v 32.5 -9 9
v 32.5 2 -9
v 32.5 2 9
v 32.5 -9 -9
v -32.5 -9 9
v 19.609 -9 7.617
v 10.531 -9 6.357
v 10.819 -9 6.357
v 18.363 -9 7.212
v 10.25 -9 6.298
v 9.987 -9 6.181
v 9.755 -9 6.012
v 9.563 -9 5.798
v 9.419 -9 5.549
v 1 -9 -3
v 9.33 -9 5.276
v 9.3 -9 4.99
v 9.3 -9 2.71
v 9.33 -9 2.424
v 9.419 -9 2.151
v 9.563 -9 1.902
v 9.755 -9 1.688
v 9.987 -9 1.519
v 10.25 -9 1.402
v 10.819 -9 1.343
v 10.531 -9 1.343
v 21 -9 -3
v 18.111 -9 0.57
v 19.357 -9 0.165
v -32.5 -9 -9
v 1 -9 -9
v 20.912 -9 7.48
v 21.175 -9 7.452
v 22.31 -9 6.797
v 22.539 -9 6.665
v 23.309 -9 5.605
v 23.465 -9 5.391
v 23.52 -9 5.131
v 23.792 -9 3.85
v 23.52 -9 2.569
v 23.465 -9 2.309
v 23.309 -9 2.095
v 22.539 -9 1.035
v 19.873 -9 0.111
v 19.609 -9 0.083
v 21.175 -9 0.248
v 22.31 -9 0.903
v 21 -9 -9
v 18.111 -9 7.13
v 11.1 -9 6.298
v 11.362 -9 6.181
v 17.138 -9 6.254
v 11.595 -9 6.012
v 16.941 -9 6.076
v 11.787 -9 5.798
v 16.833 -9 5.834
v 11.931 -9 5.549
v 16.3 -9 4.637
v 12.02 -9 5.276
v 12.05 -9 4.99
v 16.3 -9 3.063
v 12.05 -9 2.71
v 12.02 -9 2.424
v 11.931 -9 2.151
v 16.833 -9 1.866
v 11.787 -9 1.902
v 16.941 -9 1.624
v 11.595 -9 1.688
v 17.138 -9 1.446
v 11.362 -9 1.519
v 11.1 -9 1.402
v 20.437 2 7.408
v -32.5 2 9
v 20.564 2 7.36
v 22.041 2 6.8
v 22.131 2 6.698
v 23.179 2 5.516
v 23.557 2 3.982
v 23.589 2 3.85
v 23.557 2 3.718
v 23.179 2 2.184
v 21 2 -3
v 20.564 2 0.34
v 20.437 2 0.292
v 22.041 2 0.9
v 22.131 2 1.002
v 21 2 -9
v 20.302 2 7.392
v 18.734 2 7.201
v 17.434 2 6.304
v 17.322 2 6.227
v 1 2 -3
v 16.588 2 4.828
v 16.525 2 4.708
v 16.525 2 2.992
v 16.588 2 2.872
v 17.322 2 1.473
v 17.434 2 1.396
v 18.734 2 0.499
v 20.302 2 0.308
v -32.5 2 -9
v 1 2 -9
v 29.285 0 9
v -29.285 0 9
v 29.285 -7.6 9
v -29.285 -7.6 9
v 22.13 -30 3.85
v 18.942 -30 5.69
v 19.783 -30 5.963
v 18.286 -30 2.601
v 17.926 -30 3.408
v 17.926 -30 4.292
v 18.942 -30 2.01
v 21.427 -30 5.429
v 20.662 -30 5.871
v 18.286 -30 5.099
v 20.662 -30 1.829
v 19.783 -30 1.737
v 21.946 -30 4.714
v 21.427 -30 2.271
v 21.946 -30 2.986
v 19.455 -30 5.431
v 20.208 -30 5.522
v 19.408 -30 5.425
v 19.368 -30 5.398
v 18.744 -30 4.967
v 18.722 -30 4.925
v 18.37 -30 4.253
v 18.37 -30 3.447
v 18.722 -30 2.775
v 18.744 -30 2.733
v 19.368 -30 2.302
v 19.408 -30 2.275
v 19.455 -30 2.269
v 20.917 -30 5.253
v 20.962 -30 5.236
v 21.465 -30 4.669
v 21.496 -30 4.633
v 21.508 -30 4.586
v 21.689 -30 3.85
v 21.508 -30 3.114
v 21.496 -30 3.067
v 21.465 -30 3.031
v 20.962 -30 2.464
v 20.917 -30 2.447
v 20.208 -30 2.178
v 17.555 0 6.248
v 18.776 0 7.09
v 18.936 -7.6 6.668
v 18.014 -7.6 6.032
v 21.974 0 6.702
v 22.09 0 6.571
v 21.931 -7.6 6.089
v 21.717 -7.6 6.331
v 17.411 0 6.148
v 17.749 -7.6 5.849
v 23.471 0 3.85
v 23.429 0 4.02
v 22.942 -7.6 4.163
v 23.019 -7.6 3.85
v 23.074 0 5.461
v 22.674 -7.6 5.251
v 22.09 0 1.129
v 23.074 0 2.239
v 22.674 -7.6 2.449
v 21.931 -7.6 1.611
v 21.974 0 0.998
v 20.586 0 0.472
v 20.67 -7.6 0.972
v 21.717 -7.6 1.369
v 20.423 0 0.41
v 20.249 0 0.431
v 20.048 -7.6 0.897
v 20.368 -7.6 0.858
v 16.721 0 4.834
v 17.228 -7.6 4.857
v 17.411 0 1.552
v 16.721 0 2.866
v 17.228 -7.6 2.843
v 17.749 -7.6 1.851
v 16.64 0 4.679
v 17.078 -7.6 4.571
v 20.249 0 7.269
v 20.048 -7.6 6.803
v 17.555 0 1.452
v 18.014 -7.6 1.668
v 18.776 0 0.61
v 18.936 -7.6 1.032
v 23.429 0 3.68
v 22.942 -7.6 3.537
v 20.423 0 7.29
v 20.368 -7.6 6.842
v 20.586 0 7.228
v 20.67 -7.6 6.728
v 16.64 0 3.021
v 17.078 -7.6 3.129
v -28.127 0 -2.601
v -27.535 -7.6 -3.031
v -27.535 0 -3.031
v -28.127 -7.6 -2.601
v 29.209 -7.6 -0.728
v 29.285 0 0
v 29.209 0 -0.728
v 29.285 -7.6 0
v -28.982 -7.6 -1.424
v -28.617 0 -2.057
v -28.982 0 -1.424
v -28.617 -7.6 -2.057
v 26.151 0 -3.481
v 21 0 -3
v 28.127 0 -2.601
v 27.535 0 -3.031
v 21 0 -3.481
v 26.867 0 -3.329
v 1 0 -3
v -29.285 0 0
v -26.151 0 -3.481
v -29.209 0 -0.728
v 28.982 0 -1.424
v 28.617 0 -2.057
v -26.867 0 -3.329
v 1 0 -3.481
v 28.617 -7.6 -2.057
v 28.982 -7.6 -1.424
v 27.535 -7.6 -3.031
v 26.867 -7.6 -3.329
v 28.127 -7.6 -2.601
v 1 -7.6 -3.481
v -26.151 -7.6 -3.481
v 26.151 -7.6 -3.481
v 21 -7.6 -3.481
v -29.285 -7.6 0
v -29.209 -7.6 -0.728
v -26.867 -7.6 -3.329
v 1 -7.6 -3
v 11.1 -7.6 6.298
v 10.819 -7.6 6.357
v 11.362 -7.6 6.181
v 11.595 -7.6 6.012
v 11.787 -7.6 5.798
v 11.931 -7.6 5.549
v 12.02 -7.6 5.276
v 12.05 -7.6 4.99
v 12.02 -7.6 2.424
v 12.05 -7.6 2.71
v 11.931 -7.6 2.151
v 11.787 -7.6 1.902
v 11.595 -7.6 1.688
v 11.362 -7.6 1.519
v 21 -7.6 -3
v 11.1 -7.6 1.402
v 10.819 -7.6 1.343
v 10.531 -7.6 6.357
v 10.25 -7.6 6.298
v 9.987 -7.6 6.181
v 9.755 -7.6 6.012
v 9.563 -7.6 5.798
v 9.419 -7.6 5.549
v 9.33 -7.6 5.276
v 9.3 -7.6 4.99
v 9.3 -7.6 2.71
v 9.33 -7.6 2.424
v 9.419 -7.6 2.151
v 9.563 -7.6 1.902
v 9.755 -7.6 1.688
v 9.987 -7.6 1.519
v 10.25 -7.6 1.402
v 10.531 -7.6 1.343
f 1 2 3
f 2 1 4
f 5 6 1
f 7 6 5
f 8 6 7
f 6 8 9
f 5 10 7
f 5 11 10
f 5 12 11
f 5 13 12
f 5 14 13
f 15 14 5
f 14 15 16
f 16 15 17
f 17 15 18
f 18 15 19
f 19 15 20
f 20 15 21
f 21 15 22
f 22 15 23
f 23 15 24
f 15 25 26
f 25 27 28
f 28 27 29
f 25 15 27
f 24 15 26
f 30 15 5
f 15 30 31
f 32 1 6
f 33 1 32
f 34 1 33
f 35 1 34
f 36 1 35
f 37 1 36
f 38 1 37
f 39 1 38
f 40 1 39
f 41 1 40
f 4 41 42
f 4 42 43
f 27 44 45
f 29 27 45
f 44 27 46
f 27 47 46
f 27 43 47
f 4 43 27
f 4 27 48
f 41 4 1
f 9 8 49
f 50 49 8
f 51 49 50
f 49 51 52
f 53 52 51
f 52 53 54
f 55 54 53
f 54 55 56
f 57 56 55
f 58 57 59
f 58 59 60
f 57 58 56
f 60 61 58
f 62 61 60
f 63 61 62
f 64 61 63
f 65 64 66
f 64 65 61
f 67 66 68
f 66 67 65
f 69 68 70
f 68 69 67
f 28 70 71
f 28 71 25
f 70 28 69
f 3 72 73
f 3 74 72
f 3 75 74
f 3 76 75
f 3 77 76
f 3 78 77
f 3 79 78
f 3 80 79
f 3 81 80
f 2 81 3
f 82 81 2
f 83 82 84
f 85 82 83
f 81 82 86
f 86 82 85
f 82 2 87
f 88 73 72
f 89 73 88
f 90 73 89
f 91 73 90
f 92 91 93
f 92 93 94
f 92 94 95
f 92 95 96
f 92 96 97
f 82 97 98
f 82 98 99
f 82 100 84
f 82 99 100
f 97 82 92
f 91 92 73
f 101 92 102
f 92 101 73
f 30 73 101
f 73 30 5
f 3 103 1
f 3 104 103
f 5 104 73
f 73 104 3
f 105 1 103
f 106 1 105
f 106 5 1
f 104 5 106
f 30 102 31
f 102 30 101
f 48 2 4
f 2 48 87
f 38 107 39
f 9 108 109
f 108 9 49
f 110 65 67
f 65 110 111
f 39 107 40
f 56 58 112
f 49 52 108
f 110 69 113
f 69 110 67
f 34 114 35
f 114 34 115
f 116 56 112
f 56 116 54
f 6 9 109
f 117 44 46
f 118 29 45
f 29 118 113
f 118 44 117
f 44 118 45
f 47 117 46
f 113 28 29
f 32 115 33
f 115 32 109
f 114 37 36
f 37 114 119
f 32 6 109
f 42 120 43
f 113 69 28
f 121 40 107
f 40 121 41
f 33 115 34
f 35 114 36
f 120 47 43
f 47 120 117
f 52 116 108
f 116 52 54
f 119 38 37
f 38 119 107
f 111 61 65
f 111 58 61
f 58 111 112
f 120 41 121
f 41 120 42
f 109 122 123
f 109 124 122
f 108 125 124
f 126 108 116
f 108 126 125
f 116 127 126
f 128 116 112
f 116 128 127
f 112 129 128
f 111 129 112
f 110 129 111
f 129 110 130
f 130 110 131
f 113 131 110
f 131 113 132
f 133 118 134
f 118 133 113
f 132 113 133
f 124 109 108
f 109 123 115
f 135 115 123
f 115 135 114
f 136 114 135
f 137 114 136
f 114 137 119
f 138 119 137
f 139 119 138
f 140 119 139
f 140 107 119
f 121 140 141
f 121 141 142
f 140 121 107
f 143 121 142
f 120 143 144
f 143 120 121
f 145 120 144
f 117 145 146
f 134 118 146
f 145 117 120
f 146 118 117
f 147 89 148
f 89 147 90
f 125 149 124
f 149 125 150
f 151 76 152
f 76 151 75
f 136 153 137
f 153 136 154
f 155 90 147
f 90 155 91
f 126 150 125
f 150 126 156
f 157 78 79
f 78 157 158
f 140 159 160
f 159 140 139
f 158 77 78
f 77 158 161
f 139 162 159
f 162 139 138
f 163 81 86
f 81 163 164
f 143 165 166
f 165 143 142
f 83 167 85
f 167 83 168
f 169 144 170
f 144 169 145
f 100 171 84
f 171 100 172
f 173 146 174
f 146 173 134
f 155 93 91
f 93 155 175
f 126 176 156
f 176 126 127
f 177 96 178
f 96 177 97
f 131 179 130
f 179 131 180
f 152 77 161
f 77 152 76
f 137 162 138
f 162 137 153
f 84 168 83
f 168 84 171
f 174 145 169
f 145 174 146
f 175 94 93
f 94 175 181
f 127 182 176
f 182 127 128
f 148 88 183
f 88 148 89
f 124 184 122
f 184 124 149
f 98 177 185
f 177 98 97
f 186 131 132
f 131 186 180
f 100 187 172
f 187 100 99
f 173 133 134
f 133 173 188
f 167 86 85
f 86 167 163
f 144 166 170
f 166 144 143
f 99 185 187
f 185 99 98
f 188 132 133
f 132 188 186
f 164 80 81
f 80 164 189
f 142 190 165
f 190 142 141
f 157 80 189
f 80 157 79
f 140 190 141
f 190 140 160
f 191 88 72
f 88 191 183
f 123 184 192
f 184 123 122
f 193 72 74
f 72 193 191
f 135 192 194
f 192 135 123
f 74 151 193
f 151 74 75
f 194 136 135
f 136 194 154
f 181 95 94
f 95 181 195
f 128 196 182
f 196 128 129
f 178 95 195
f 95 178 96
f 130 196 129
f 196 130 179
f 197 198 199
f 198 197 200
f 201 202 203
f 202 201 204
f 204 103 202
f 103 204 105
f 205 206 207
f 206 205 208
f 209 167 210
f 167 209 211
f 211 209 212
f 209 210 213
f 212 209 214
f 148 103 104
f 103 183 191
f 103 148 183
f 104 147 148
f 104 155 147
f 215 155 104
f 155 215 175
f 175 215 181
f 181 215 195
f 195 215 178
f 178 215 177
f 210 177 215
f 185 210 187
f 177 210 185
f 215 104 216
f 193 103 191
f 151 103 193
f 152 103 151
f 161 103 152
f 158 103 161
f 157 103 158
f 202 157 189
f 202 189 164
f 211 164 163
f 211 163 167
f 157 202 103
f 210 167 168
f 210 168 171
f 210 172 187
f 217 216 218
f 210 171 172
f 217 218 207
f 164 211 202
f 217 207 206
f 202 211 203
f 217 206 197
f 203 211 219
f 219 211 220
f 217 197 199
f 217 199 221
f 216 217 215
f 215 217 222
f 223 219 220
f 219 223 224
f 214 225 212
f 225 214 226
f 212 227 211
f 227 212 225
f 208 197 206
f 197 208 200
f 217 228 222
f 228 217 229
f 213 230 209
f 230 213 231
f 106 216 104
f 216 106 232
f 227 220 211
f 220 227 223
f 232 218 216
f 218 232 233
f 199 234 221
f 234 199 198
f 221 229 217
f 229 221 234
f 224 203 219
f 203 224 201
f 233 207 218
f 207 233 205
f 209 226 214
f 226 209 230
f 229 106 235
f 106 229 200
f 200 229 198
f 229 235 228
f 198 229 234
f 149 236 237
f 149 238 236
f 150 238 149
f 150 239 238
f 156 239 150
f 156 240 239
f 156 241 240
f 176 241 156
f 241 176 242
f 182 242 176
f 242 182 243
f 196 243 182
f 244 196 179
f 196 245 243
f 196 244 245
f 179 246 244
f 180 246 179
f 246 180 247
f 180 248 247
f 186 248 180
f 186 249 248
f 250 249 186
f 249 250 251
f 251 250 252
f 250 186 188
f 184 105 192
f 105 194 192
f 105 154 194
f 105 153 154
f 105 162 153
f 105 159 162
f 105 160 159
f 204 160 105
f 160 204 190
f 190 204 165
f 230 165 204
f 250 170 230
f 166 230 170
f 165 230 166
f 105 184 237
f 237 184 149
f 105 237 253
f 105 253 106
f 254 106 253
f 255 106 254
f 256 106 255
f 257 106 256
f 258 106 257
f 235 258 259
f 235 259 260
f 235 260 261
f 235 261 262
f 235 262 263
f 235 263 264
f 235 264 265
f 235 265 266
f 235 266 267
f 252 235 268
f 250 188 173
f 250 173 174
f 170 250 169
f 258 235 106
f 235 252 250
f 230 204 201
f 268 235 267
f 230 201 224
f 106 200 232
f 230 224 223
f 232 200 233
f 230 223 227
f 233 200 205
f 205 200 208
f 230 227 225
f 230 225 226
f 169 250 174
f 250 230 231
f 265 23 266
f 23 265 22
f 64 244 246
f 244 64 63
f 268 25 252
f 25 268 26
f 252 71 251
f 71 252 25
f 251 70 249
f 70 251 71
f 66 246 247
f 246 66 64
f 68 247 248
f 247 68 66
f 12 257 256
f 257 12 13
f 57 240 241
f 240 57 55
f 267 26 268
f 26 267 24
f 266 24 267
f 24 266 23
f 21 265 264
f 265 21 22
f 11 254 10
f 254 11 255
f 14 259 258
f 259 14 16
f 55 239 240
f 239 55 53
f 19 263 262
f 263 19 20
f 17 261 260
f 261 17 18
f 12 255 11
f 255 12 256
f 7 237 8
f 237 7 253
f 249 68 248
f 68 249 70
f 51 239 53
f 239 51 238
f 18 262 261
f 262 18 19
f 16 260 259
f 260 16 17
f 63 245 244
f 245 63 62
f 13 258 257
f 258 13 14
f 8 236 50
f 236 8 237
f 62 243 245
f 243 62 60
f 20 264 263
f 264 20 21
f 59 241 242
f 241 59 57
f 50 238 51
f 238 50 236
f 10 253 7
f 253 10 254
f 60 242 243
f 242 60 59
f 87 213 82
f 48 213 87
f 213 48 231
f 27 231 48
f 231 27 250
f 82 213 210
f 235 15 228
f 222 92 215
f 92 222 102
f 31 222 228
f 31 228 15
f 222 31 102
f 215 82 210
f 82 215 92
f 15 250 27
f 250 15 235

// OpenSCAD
rotate([90,0,0])difference(){
union(){

translate([0,0,3.5])cube([65,18,11],center=true);
translate([(58.57)/2-9.28,-3.5+7.35,0])cylinder(r2=4.25/2,r1=9/2,h=30);
}
union(){
translate([(58.57)/2-9.28,-3.5+7.35,-9])cylinder(r2=3.25/2,r1=8/2,h=40);
hull(){
translate([-(51.57)/2,0,0])cylinder(r=3.5,h=7.6,$fn=30);
translate([(51.57)/2,0,0])cylinder(r=3.5,h=7.6,$fn=30);
translate([(51.57)/2,8,7.6/2])cube([7,7,7.6],center=true);
translate([-(51.57)/2,8,7.6/2])cube([7,7,7.6],center=true);
}
translate([(58.57)/2-9.28,-3.5+7.35,0])cylinder(r=3.5,h=7.4,$fn=30);
#hull(){
translate([(58.57)/2-9.28-9.33,-3.5+7.35+1.14,0])cylinder(r=2.75/2,h=9.4,$fn=30);
translate([(58.57)/2-9.28-9.33,-3.5+7.35-1.14,0])cylinder(r=2.75/2,h=9.4,$fn=30);
}
}
translate([11,-13,0])cube(20,center=true);

}
